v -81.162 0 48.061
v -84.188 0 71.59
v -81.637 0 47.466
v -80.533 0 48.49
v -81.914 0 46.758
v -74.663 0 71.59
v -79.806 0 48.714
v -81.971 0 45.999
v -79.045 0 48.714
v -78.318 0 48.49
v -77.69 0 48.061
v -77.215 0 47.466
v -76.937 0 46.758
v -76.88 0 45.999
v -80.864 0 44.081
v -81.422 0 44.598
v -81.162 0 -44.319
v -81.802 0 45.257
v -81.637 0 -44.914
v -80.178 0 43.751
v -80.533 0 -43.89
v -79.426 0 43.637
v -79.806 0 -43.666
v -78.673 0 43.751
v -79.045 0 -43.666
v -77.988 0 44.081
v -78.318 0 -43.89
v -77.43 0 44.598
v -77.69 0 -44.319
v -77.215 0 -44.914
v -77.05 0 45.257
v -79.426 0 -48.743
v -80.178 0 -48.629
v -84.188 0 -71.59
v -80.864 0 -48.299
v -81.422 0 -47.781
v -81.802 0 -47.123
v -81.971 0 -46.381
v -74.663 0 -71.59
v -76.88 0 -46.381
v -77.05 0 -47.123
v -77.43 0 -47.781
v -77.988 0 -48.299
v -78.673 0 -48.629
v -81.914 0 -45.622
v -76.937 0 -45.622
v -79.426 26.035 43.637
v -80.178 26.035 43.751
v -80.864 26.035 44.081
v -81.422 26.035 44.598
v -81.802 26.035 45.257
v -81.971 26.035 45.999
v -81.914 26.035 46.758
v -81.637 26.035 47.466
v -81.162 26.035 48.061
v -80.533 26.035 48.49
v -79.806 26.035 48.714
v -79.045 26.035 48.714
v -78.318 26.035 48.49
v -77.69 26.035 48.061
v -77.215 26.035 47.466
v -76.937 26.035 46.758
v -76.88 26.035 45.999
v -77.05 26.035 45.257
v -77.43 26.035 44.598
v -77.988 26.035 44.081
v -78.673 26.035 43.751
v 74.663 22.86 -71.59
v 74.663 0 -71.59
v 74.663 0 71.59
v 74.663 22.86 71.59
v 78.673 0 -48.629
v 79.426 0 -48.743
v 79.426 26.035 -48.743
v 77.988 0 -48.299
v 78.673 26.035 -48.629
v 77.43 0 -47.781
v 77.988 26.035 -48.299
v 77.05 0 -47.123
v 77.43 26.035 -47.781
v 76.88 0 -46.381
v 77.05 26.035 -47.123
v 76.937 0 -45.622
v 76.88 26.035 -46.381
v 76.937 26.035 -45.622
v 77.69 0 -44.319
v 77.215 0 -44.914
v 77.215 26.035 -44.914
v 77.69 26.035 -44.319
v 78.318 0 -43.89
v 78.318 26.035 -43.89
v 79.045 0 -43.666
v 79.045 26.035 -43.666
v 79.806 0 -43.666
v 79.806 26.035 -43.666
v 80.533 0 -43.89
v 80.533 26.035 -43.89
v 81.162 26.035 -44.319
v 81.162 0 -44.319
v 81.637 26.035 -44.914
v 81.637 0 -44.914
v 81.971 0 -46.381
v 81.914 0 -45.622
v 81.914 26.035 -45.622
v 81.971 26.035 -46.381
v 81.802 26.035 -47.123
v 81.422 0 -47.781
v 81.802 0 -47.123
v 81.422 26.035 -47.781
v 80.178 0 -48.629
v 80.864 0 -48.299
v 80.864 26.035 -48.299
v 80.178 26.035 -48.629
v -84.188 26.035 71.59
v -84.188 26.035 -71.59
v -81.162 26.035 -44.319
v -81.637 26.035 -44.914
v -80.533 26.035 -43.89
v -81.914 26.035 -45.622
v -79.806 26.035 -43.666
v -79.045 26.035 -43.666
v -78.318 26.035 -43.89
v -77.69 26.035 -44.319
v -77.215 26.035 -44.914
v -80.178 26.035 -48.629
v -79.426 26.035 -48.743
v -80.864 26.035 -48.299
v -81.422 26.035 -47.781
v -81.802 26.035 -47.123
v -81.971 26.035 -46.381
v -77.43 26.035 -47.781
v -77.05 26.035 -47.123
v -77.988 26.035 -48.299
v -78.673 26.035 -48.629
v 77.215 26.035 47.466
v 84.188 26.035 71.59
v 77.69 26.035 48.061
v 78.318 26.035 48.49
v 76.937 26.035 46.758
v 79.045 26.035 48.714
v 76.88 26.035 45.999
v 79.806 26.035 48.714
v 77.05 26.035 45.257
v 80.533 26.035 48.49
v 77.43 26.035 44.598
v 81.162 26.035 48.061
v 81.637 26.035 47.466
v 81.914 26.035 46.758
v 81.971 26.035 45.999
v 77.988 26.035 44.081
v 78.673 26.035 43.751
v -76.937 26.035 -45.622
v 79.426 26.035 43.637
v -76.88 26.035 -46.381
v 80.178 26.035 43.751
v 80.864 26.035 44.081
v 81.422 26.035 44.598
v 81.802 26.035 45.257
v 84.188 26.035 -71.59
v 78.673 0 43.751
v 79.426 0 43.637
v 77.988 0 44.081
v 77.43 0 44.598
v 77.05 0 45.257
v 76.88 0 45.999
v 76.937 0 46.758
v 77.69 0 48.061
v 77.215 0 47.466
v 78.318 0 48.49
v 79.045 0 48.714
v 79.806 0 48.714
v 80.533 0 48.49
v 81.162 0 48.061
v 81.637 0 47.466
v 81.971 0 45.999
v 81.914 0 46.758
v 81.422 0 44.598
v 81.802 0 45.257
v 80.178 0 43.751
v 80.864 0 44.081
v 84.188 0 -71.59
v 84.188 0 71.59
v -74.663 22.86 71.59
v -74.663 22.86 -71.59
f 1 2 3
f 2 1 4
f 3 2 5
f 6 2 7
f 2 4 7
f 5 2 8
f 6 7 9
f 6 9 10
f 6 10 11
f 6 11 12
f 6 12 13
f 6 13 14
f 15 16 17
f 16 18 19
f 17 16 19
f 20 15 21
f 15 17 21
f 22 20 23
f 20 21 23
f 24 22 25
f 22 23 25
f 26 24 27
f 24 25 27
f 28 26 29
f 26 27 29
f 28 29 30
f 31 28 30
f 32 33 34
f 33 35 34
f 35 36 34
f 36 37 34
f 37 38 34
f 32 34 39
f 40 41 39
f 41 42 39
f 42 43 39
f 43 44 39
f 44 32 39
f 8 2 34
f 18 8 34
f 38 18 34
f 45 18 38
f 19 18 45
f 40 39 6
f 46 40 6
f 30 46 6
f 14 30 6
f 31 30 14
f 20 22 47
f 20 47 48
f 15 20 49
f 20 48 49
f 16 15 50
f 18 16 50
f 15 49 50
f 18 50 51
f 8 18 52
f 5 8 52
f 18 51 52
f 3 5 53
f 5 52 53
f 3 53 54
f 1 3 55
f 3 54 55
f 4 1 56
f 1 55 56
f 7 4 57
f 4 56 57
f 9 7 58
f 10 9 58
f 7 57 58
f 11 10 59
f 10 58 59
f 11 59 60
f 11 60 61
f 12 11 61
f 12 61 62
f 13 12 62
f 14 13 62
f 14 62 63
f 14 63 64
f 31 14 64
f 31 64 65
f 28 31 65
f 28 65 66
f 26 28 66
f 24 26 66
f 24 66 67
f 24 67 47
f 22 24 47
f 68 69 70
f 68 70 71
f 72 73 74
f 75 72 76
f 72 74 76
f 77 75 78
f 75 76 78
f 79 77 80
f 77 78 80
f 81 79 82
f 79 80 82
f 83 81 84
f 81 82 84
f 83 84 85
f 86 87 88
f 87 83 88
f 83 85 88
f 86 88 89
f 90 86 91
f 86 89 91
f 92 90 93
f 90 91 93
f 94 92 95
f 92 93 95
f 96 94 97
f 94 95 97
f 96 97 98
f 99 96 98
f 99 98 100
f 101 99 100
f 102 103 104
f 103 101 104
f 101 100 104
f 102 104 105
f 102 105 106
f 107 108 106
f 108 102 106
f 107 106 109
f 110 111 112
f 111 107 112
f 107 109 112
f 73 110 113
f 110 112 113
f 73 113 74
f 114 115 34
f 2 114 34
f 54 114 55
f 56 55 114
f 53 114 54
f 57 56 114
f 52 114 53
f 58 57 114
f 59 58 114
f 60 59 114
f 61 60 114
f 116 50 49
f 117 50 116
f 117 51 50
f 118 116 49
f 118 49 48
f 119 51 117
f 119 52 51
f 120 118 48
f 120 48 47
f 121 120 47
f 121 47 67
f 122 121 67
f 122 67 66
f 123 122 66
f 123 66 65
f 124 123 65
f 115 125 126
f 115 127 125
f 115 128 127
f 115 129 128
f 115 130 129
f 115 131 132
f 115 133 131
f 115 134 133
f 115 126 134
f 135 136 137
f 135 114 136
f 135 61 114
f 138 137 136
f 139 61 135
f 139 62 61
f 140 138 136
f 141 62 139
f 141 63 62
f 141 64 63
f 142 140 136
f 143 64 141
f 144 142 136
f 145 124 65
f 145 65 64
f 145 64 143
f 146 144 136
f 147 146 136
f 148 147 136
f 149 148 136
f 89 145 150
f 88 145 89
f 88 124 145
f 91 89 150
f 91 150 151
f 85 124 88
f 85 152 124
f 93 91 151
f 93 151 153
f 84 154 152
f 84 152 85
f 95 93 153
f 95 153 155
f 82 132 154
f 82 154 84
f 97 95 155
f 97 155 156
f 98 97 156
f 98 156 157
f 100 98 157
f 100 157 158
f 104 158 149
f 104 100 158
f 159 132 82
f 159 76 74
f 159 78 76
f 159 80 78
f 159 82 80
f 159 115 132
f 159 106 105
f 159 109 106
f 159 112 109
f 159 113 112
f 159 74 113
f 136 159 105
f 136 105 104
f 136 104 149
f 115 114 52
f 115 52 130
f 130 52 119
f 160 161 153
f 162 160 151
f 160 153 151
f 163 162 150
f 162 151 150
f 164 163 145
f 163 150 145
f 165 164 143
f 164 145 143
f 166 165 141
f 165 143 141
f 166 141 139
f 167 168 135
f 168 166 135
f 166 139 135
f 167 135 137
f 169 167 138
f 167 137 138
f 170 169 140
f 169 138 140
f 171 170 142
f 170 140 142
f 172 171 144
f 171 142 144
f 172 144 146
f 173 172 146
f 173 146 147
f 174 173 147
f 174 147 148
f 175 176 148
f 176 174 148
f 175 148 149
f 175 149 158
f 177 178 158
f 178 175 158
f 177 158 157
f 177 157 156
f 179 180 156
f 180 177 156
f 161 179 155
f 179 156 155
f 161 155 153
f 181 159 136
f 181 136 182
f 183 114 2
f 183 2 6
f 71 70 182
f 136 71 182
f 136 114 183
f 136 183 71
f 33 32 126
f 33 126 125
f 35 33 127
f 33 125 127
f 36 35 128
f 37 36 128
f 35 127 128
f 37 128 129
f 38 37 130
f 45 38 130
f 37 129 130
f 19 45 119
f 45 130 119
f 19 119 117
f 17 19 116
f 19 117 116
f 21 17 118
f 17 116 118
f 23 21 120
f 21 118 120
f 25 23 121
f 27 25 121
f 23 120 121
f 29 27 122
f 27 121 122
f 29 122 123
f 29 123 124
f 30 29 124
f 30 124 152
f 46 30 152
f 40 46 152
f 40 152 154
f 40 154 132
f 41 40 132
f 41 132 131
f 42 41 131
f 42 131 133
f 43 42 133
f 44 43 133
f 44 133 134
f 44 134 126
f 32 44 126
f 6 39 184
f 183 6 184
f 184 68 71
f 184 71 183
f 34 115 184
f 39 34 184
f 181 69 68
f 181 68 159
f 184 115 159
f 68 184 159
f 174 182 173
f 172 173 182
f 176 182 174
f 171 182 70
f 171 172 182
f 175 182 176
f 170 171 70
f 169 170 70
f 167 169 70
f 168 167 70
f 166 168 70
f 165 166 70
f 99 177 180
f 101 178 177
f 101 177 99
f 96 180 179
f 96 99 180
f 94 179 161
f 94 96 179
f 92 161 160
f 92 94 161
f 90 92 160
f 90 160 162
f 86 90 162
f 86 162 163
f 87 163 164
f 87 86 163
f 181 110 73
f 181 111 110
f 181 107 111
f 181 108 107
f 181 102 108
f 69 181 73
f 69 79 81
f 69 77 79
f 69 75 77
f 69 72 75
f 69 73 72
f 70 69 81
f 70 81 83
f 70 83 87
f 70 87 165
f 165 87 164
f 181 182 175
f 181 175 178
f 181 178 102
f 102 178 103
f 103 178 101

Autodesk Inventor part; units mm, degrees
ref_plane "YZ Plane" through (0, 0, 0) normal (1, 0, 0) x (0, 1, 0)
ref_plane "XZ Plane" through (0, 0, 0) normal (0, 1, 0) x (-1, 0, 0)
ref_plane "XY Plane" through (0, 0, 0) normal (0, 0, 1) x (1, 0, 0)
sketch "Sketch1" plane through (0, 0, 0) normal (0, 0, 1) x (1, 0, 0)
  line L0 (0, 26.035) -> (-84.1883, 26.035)
  line L1 (-84.1883, 26.035) -> (-84.1883, 0)
  line L2 (-84.1883, 0) -> (-74.6633, 0)
  line L3 (-74.6633, 0) -> (-74.6633, 22.86)
  line L4 (-74.6633, 22.86) -> (0, 22.86)
  line L5 (0, 0) -> (0, 26.035) construction
  line L6 (0, 26.035) -> (84.1883, 26.035)
  line L7 (84.1883, 26.035) -> (84.1883, 0)
  line L8 (84.1883, 0) -> (74.6633, 0)
  line L9 (74.6633, 0) -> (74.6633, 22.86)
  line L10 (74.6633, 22.86) -> (0, 22.86)
  dimension "d0" = 22.86
  dimension "d1" = 3.175
  dimension "d2" = 9.525
  dimension "d3" = 74.6633
extrude "Extrusion1" add sketch "Sketch1" along normal mid plane 143.1798
sketch "Sketch2" plane through (-84.1883, 0, 71.5899) normal (0, -1, 0) x (1, 0, 0)
  line L0 (0, -143.1798) -> (168.3766, -143.1798) construction
  line L1 (4.7625, -143.1798) -> (4.7625, -0.1575) construction
  line L2 (0, 0) -> (9.525, 0) projected
  point P0 (84.1883, -71.5899)
  point P1 (4.7625, -117.7798)
  point P2 (4.7625, -25.4)
  dimension "d6" = 4.7625
  dimension "d7" = 25.4
  dimension "d8" = 25.4
hole "Hole1" at (-79.4258, 0, -46.1899) at (-79.4258, 0, 46.1899) direction (0, 1, 0) diameter 5.1054 end through all clearance for "Flat Head Machine Screw (82)" size "#10" standard "Ansi Unified Screw Threads"
mirror "Mirror1" about plane through (0, 0, 0) normal (1, 0, 0) of "Hole1"
sketch "Sketch3" plane through (-84.1883, 26.035, 71.5899) normal (0, 1, 0) x (1, 0, 0)
  line L0 (11.1125, 0) -> (157.2641, 0) construction
  line L1 (157.2641, 0) -> (157.2641, 143.1798) construction
  line L2 (157.2641, 143.1798) -> (11.1125, 143.1798) construction
  line L3 (11.1125, 143.1798) -> (11.1125, 0) construction
  line L4 (11.1125, 0) -> (157.2641, 143.1798) construction
  line L5 (157.2641, 0) -> (11.1125, 143.1798) construction
  line L6 (51.9303, 1.2954) -> (83.4263, 1.2954)
  line L7 (83.4263, 1.2954) -> (83.4263, 9.9314)
  line L8 (83.4263, 9.9314) -> (51.9303, 9.9314)
  line L9 (51.9303, 9.9314) -> (51.9303, 1.2954)
  line L10 (51.9303, 1.2954) -> (83.4263, 9.9314) construction
  line L11 (83.4263, 1.2954) -> (51.9303, 9.9314) construction
  line L12 (168.3766, 0) -> (0, 0) projected
  line L13 (84.9503, 1.2954) -> (116.4463, 1.2954)
  line L14 (116.4463, 1.2954) -> (116.4463, 9.9314)
  line L15 (116.4463, 9.9314) -> (84.9503, 9.9314)
  line L16 (84.9503, 9.9314) -> (84.9503, 1.2954)
  line L17 (84.9503, 1.2954) -> (116.4463, 9.9314) construction
  line L18 (116.4463, 1.2954) -> (84.9503, 9.9314) construction
  line L19 (123.5075, 2.8702) -> (145.4785, 2.8702)
  line L20 (145.4785, 2.8702) -> (145.4785, 20.6502)
  line L21 (145.4785, 20.6502) -> (123.5075, 20.6502)
  line L22 (123.5075, 20.6502) -> (123.5075, 2.8702)
  line L23 (123.5075, 2.8702) -> (145.4785, 20.6502) construction
  line L24 (145.4785, 2.8702) -> (123.5075, 20.6502) construction
  line L25 (15.2273, 15.1892) -> (24.7523, 15.1892)
  line L26 (24.7523, 15.1892) -> (24.7523, 92.4052)
  line L27 (24.7523, 92.4052) -> (15.2273, 92.4052)
  line L28 (15.2273, 92.4052) -> (15.2273, 15.1892)
  line L29 (15.2273, 15.1892) -> (24.7523, 92.4052) construction
  line L30 (24.7523, 15.1892) -> (15.2273, 92.4052) construction
  line L31 (123.0503, 118.7704) -> (133.0833, 118.7704)
  line L32 (133.0833, 118.7704) -> (133.0833, 140.8684)
  line L33 (133.0833, 140.8684) -> (123.0503, 140.8684)
  line L34 (123.0503, 140.8684) -> (123.0503, 118.7704)
  line L35 (123.0503, 118.7704) -> (133.0833, 140.8684) construction
  line L36 (133.0833, 118.7704) -> (123.0503, 140.8684) construction
  line L37 (137.5791, 97.028) -> (157.2641, 97.028)
  line L38 (157.2641, 97.028) -> (157.2641, 133.096)
  line L39 (157.2641, 133.096) -> (137.5791, 133.096)
  line L40 (137.5791, 133.096) -> (137.5791, 97.028)
  line L41 (137.5791, 97.028) -> (157.2641, 133.096) construction
  line L42 (157.2641, 97.028) -> (137.5791, 133.096) construction
  line L43 (144.5133, 16.3322) -> (154.0383, 16.3322)
  line L44 (154.0383, 16.3322) -> (154.0383, 95.4786)
  line L45 (154.0383, 95.4786) -> (144.5133, 95.4786)
  line L46 (144.5133, 95.4786) -> (144.5133, 16.3322)
  line L47 (144.5133, 16.3322) -> (154.0383, 95.4786) construction
  line L48 (154.0383, 16.3322) -> (144.5133, 95.4786) construction
  line L49 (36.8173, 121.8184) -> (48.1203, 121.8184)
  line L50 (48.1203, 121.8184) -> (48.1203, 139.0904)
  line L51 (48.1203, 139.0904) -> (36.8173, 139.0904)
  line L52 (36.8173, 139.0904) -> (36.8173, 121.8184)
  line L53 (36.8173, 121.8184) -> (48.1203, 139.0904) construction
  line L54 (48.1203, 121.8184) -> (36.8173, 139.0904) construction
  line L55 (29.0703, 4.1148) -> (37.8333, 4.1148)
  line L56 (37.8333, 4.1148) -> (37.8333, 12.8778)
  line L57 (37.8333, 12.8778) -> (29.0703, 12.8778)
  line L58 (29.0703, 12.8778) -> (29.0703, 4.1148)
  line L59 (29.0703, 4.1148) -> (37.8333, 12.8778) construction
  line L60 (37.8333, 4.1148) -> (29.0703, 12.8778) construction
  line L61 (15.2273, 95.2754) -> (24.7523, 95.2754)
  line L62 (24.7523, 95.2754) -> (24.7523, 104.8004)
  line L63 (24.7523, 104.8004) -> (15.2273, 104.8004)
  line L64 (15.2273, 104.8004) -> (15.2273, 95.2754)
  line L65 (15.2273, 95.2754) -> (24.7523, 104.8004) construction
  line L66 (24.7523, 95.2754) -> (15.2273, 104.8004) construction
  line L67 (15.2273, 106.68) -> (25.8953, 106.68)
  line L68 (25.8953, 106.68) -> (25.8953, 114.681)
  line L69 (25.8953, 114.681) -> (15.2273, 114.681)
  line L70 (15.2273, 114.681) -> (15.2273, 106.68)
  line L71 (15.2273, 106.68) -> (25.8953, 114.681) construction
  line L72 (25.8953, 106.68) -> (15.2273, 114.681) construction
  point P0 (84.1883, 71.5899)
  point P1 (67.6783, 5.6134)
  point P2 (100.6983, 5.6134)
  point P3 (134.493, 11.7602)
  point P4 (19.9898, 53.7972)
  point P5 (128.0668, 129.8194)
  point P6 (147.4216, 115.062)
  point P7 (149.2758, 55.9054)
  point P8 (42.4688, 130.4544)
  point P9 (33.4518, 8.4963)
  point P10 (19.9898, 100.0379)
  point P11 (20.5613, 110.6805)
  dimension "d16" = 143.1798
  dimension "d17" = 146.1516
  dimension "d18" = 31.496
  dimension "d19" = 8.636
  dimension "d20" = 40.8178
  dimension "d21" = 1.2954
  dimension "d22" = 31.496
  dimension "d23" = 8.636
  dimension "d24" = 73.8378
  dimension "d25" = 1.2954
  dimension "d26" = 17.78
  dimension "d27" = 21.971
  dimension "d28" = 2.8702
  dimension "d29" = 112.395
  dimension "d30" = 77.216
  dimension "d31" = 9.525
  dimension "d32" = 15.1892
  dimension "d33" = 4.1148
  dimension "d34" = 10.033
  dimension "d35" = 22.098
  dimension "d36" = 111.9378
  dimension "d37" = 118.7704
  dimension "d38" = 19.685
  dimension "d39" = 36.068
  dimension "d40" = 97.028
  dimension "d41" = 9.525
  dimension "d42" = 79.1464
  dimension "d43" = 16.3322
  dimension "d44" = 133.4008
  dimension "d45" = 11.303
  dimension "d46" = 17.272
  dimension "d47" = 25.7048
  dimension "d48" = 121.8184
  dimension "d49" = 8.763
  dimension "d50" = 8.763
  dimension "d51" = 17.9578
  dimension "d52" = 4.1148
  dimension "d53" = 9.525
  dimension "d54" = 9.525
  dimension "d55" = 95.2754
  dimension "d56" = 4.1148
  dimension "d57" = 10.668
  dimension "d58" = 8.001
  dimension "d59" = 4.1148
  dimension "d60" = 106.68
equation "\"d0\" = heightForRIO"
equation "\"d1\" = topWallThickness"
equation "\"d2\" = edgeWallThickness"
equation "\"d3\" = 0.5 * widthOfRIO + widthAirGap"
equation "\"d4\" = depthOfRIO"
equation "\"d6\" = 0.5 * edgeWallThickness"
equation "\"d16\" = depthOfRIO"
equation "\"d17\" = widthOfRIO"
equation "\"d18\" = widthForBottomRelay"
equation "\"d19\" = depthForBottomRelay"
equation "\"d20\" = edgeToBottomRelay"
equation "\"d21\" = bottomToBottomRelay"
equation "\"d22\" = widthForBottomAnalogIn"
equation "\"d23\" = depthForBottomAnalogIn"
equation "\"d24\" = edgeToBottomAnalogIn"
equation "\"d25\" = bottomToBottomAnalogIn"
equation "\"d26\" = buttonDepth"
equation "\"d27\" = buttonWidth"
equation "\"d28\" = bottomToBottomButton"
equation "\"d29\" = edgeToBottomButton"
equation "\"d30\" = depthLeftDIO"
equation "\"d31\" = widthLeftDIO"
equation "\"d32\" = bottomToLeftDIO"
equation "\"d33\" = edgeToLeftDIO"
equation "\"d34\" = widthSPI"
equation "\"d35\" = depthSPI"
equation "\"d36\" = edgeToSPI"
equation "\"d37\" = bottomToSPI"
equation "\"d38\" = widthLight"
equation "\"d39\" = depthLight"
equation "\"d40\" = bottomToLight"
equation "\"d41\" = widthPWM"
equation "\"d42\" = depthPWM"
equation "\"d43\" = bottomToPWM"
equation "\"d44\" = edgeToPWM"
equation "\"d45\" = widthPower"
equation "\"d46\" = depthPower"
equation "\"d47\" = edgeToPower"
equation "\"d48\" = bottomToPower"
equation "\"d49\" = widthRSL"
equation "\"d50\" = depthRSL"
equation "\"d51\" = edgeToRSL"
equation "\"d52\" = bottomToRSL"
equation "\"d53\" = widthRS232"
equation "\"d54\" = depthRS232"
equation "\"d55\" = bottomToRS232"
equation "\"d56\" = edgeToRS232"
equation "\"d57\" = widthI2C"
equation "\"d58\" = depthI2C"
equation "\"d59\" = edgeToI2C"
equation "\"d60\" = bottomToI2C"
equation "\"heightForRIO\" = 22.86"
equation "\"topWallThickness\" = 3.175"
equation "\"edgeWallThickness\" = 9.525"
equation "\"widthOfRIO\" = 146.1516"
equation "\"widthAirGap\" = 1.5875"
equation "\"depthOfRIO\" = 143.1798"
equation "\"depthForBottomRelay\" = 8.636"
equation "\"widthForBottomRelay\" = 31.496"
equation "\"componentGap\" = 3.175"
equation "\"edgeToBottomRelay\" = 40.8178"
equation "\"bottomToBottomRelay\" = 1.2954"
equation "\"depthForBottomAnalogIn\" = 8.636"
equation "\"widthForBottomAnalogIn\" = 31.496"
equation "\"edgeToBottomAnalogIn\" = 73.8378"
equation "\"bottomToBottomAnalogIn\" = 1.2954"
equation "\"buttonWidth\" = 21.971"
equation "\"buttonDepth\" = 17.78"
equation "\"bottomToBottomButton\" = 2.8702"
equation "\"edgeToBottomButton\" = 112.395"
equation "\"widthLeftDIO\" = 9.525"
equation "\"depthLeftDIO\" = 77.216"
equation "\"bottomToLeftDIO\" = 15.1892"
equation "\"edgeToLeftDIO\" = 4.1148"
equation "\"widthSPI\" = 10.033"
equation "\"depthSPI\" = 22.098"
equation "\"edgeToSPI\" = 111.9378"
equation "\"bottomToSPI\" = 118.7704"
equation "\"widthLight\" = 19.685"
equation "\"depthLight\" = 36.068"
equation "\"bottomToLight\" = 97.028"
equation "\"widthPWM\" = 9.525"
equation "\"depthPWM\" = 79.1464"
equation "\"bottomToPWM\" = 16.3322"
equation "\"edgeToPWM\" = 133.4008"
equation "\"widthPower\" = 11.303"
equation "\"depthPower\" = 17.272"
equation "\"edgeToPower\" = 25.7048"
equation "\"bottomToPower\" = 121.8184"
equation "\"widthRSL\" = 8.763"
equation "\"depthRSL\" = 8.763"
equation "\"bottomToRSL\" = 4.1148"
equation "\"edgeToRSL\" = 17.9578"
equation "\"widthRS232\" = 9.525"
equation "\"depthRS232\" = 9.525"
equation "\"bottomToRS232\" = 95.2754"
equation "\"edgeToRS232\" = 4.1148"
equation "\"widthI2C\" = 10.668"
equation "\"depthI2C\" = 8.001"
equation "\"edgeToI2C\" = 4.1148"
equation "\"bottomToI2C\" = 106.68"
properties part number "RioCoverPlate"
